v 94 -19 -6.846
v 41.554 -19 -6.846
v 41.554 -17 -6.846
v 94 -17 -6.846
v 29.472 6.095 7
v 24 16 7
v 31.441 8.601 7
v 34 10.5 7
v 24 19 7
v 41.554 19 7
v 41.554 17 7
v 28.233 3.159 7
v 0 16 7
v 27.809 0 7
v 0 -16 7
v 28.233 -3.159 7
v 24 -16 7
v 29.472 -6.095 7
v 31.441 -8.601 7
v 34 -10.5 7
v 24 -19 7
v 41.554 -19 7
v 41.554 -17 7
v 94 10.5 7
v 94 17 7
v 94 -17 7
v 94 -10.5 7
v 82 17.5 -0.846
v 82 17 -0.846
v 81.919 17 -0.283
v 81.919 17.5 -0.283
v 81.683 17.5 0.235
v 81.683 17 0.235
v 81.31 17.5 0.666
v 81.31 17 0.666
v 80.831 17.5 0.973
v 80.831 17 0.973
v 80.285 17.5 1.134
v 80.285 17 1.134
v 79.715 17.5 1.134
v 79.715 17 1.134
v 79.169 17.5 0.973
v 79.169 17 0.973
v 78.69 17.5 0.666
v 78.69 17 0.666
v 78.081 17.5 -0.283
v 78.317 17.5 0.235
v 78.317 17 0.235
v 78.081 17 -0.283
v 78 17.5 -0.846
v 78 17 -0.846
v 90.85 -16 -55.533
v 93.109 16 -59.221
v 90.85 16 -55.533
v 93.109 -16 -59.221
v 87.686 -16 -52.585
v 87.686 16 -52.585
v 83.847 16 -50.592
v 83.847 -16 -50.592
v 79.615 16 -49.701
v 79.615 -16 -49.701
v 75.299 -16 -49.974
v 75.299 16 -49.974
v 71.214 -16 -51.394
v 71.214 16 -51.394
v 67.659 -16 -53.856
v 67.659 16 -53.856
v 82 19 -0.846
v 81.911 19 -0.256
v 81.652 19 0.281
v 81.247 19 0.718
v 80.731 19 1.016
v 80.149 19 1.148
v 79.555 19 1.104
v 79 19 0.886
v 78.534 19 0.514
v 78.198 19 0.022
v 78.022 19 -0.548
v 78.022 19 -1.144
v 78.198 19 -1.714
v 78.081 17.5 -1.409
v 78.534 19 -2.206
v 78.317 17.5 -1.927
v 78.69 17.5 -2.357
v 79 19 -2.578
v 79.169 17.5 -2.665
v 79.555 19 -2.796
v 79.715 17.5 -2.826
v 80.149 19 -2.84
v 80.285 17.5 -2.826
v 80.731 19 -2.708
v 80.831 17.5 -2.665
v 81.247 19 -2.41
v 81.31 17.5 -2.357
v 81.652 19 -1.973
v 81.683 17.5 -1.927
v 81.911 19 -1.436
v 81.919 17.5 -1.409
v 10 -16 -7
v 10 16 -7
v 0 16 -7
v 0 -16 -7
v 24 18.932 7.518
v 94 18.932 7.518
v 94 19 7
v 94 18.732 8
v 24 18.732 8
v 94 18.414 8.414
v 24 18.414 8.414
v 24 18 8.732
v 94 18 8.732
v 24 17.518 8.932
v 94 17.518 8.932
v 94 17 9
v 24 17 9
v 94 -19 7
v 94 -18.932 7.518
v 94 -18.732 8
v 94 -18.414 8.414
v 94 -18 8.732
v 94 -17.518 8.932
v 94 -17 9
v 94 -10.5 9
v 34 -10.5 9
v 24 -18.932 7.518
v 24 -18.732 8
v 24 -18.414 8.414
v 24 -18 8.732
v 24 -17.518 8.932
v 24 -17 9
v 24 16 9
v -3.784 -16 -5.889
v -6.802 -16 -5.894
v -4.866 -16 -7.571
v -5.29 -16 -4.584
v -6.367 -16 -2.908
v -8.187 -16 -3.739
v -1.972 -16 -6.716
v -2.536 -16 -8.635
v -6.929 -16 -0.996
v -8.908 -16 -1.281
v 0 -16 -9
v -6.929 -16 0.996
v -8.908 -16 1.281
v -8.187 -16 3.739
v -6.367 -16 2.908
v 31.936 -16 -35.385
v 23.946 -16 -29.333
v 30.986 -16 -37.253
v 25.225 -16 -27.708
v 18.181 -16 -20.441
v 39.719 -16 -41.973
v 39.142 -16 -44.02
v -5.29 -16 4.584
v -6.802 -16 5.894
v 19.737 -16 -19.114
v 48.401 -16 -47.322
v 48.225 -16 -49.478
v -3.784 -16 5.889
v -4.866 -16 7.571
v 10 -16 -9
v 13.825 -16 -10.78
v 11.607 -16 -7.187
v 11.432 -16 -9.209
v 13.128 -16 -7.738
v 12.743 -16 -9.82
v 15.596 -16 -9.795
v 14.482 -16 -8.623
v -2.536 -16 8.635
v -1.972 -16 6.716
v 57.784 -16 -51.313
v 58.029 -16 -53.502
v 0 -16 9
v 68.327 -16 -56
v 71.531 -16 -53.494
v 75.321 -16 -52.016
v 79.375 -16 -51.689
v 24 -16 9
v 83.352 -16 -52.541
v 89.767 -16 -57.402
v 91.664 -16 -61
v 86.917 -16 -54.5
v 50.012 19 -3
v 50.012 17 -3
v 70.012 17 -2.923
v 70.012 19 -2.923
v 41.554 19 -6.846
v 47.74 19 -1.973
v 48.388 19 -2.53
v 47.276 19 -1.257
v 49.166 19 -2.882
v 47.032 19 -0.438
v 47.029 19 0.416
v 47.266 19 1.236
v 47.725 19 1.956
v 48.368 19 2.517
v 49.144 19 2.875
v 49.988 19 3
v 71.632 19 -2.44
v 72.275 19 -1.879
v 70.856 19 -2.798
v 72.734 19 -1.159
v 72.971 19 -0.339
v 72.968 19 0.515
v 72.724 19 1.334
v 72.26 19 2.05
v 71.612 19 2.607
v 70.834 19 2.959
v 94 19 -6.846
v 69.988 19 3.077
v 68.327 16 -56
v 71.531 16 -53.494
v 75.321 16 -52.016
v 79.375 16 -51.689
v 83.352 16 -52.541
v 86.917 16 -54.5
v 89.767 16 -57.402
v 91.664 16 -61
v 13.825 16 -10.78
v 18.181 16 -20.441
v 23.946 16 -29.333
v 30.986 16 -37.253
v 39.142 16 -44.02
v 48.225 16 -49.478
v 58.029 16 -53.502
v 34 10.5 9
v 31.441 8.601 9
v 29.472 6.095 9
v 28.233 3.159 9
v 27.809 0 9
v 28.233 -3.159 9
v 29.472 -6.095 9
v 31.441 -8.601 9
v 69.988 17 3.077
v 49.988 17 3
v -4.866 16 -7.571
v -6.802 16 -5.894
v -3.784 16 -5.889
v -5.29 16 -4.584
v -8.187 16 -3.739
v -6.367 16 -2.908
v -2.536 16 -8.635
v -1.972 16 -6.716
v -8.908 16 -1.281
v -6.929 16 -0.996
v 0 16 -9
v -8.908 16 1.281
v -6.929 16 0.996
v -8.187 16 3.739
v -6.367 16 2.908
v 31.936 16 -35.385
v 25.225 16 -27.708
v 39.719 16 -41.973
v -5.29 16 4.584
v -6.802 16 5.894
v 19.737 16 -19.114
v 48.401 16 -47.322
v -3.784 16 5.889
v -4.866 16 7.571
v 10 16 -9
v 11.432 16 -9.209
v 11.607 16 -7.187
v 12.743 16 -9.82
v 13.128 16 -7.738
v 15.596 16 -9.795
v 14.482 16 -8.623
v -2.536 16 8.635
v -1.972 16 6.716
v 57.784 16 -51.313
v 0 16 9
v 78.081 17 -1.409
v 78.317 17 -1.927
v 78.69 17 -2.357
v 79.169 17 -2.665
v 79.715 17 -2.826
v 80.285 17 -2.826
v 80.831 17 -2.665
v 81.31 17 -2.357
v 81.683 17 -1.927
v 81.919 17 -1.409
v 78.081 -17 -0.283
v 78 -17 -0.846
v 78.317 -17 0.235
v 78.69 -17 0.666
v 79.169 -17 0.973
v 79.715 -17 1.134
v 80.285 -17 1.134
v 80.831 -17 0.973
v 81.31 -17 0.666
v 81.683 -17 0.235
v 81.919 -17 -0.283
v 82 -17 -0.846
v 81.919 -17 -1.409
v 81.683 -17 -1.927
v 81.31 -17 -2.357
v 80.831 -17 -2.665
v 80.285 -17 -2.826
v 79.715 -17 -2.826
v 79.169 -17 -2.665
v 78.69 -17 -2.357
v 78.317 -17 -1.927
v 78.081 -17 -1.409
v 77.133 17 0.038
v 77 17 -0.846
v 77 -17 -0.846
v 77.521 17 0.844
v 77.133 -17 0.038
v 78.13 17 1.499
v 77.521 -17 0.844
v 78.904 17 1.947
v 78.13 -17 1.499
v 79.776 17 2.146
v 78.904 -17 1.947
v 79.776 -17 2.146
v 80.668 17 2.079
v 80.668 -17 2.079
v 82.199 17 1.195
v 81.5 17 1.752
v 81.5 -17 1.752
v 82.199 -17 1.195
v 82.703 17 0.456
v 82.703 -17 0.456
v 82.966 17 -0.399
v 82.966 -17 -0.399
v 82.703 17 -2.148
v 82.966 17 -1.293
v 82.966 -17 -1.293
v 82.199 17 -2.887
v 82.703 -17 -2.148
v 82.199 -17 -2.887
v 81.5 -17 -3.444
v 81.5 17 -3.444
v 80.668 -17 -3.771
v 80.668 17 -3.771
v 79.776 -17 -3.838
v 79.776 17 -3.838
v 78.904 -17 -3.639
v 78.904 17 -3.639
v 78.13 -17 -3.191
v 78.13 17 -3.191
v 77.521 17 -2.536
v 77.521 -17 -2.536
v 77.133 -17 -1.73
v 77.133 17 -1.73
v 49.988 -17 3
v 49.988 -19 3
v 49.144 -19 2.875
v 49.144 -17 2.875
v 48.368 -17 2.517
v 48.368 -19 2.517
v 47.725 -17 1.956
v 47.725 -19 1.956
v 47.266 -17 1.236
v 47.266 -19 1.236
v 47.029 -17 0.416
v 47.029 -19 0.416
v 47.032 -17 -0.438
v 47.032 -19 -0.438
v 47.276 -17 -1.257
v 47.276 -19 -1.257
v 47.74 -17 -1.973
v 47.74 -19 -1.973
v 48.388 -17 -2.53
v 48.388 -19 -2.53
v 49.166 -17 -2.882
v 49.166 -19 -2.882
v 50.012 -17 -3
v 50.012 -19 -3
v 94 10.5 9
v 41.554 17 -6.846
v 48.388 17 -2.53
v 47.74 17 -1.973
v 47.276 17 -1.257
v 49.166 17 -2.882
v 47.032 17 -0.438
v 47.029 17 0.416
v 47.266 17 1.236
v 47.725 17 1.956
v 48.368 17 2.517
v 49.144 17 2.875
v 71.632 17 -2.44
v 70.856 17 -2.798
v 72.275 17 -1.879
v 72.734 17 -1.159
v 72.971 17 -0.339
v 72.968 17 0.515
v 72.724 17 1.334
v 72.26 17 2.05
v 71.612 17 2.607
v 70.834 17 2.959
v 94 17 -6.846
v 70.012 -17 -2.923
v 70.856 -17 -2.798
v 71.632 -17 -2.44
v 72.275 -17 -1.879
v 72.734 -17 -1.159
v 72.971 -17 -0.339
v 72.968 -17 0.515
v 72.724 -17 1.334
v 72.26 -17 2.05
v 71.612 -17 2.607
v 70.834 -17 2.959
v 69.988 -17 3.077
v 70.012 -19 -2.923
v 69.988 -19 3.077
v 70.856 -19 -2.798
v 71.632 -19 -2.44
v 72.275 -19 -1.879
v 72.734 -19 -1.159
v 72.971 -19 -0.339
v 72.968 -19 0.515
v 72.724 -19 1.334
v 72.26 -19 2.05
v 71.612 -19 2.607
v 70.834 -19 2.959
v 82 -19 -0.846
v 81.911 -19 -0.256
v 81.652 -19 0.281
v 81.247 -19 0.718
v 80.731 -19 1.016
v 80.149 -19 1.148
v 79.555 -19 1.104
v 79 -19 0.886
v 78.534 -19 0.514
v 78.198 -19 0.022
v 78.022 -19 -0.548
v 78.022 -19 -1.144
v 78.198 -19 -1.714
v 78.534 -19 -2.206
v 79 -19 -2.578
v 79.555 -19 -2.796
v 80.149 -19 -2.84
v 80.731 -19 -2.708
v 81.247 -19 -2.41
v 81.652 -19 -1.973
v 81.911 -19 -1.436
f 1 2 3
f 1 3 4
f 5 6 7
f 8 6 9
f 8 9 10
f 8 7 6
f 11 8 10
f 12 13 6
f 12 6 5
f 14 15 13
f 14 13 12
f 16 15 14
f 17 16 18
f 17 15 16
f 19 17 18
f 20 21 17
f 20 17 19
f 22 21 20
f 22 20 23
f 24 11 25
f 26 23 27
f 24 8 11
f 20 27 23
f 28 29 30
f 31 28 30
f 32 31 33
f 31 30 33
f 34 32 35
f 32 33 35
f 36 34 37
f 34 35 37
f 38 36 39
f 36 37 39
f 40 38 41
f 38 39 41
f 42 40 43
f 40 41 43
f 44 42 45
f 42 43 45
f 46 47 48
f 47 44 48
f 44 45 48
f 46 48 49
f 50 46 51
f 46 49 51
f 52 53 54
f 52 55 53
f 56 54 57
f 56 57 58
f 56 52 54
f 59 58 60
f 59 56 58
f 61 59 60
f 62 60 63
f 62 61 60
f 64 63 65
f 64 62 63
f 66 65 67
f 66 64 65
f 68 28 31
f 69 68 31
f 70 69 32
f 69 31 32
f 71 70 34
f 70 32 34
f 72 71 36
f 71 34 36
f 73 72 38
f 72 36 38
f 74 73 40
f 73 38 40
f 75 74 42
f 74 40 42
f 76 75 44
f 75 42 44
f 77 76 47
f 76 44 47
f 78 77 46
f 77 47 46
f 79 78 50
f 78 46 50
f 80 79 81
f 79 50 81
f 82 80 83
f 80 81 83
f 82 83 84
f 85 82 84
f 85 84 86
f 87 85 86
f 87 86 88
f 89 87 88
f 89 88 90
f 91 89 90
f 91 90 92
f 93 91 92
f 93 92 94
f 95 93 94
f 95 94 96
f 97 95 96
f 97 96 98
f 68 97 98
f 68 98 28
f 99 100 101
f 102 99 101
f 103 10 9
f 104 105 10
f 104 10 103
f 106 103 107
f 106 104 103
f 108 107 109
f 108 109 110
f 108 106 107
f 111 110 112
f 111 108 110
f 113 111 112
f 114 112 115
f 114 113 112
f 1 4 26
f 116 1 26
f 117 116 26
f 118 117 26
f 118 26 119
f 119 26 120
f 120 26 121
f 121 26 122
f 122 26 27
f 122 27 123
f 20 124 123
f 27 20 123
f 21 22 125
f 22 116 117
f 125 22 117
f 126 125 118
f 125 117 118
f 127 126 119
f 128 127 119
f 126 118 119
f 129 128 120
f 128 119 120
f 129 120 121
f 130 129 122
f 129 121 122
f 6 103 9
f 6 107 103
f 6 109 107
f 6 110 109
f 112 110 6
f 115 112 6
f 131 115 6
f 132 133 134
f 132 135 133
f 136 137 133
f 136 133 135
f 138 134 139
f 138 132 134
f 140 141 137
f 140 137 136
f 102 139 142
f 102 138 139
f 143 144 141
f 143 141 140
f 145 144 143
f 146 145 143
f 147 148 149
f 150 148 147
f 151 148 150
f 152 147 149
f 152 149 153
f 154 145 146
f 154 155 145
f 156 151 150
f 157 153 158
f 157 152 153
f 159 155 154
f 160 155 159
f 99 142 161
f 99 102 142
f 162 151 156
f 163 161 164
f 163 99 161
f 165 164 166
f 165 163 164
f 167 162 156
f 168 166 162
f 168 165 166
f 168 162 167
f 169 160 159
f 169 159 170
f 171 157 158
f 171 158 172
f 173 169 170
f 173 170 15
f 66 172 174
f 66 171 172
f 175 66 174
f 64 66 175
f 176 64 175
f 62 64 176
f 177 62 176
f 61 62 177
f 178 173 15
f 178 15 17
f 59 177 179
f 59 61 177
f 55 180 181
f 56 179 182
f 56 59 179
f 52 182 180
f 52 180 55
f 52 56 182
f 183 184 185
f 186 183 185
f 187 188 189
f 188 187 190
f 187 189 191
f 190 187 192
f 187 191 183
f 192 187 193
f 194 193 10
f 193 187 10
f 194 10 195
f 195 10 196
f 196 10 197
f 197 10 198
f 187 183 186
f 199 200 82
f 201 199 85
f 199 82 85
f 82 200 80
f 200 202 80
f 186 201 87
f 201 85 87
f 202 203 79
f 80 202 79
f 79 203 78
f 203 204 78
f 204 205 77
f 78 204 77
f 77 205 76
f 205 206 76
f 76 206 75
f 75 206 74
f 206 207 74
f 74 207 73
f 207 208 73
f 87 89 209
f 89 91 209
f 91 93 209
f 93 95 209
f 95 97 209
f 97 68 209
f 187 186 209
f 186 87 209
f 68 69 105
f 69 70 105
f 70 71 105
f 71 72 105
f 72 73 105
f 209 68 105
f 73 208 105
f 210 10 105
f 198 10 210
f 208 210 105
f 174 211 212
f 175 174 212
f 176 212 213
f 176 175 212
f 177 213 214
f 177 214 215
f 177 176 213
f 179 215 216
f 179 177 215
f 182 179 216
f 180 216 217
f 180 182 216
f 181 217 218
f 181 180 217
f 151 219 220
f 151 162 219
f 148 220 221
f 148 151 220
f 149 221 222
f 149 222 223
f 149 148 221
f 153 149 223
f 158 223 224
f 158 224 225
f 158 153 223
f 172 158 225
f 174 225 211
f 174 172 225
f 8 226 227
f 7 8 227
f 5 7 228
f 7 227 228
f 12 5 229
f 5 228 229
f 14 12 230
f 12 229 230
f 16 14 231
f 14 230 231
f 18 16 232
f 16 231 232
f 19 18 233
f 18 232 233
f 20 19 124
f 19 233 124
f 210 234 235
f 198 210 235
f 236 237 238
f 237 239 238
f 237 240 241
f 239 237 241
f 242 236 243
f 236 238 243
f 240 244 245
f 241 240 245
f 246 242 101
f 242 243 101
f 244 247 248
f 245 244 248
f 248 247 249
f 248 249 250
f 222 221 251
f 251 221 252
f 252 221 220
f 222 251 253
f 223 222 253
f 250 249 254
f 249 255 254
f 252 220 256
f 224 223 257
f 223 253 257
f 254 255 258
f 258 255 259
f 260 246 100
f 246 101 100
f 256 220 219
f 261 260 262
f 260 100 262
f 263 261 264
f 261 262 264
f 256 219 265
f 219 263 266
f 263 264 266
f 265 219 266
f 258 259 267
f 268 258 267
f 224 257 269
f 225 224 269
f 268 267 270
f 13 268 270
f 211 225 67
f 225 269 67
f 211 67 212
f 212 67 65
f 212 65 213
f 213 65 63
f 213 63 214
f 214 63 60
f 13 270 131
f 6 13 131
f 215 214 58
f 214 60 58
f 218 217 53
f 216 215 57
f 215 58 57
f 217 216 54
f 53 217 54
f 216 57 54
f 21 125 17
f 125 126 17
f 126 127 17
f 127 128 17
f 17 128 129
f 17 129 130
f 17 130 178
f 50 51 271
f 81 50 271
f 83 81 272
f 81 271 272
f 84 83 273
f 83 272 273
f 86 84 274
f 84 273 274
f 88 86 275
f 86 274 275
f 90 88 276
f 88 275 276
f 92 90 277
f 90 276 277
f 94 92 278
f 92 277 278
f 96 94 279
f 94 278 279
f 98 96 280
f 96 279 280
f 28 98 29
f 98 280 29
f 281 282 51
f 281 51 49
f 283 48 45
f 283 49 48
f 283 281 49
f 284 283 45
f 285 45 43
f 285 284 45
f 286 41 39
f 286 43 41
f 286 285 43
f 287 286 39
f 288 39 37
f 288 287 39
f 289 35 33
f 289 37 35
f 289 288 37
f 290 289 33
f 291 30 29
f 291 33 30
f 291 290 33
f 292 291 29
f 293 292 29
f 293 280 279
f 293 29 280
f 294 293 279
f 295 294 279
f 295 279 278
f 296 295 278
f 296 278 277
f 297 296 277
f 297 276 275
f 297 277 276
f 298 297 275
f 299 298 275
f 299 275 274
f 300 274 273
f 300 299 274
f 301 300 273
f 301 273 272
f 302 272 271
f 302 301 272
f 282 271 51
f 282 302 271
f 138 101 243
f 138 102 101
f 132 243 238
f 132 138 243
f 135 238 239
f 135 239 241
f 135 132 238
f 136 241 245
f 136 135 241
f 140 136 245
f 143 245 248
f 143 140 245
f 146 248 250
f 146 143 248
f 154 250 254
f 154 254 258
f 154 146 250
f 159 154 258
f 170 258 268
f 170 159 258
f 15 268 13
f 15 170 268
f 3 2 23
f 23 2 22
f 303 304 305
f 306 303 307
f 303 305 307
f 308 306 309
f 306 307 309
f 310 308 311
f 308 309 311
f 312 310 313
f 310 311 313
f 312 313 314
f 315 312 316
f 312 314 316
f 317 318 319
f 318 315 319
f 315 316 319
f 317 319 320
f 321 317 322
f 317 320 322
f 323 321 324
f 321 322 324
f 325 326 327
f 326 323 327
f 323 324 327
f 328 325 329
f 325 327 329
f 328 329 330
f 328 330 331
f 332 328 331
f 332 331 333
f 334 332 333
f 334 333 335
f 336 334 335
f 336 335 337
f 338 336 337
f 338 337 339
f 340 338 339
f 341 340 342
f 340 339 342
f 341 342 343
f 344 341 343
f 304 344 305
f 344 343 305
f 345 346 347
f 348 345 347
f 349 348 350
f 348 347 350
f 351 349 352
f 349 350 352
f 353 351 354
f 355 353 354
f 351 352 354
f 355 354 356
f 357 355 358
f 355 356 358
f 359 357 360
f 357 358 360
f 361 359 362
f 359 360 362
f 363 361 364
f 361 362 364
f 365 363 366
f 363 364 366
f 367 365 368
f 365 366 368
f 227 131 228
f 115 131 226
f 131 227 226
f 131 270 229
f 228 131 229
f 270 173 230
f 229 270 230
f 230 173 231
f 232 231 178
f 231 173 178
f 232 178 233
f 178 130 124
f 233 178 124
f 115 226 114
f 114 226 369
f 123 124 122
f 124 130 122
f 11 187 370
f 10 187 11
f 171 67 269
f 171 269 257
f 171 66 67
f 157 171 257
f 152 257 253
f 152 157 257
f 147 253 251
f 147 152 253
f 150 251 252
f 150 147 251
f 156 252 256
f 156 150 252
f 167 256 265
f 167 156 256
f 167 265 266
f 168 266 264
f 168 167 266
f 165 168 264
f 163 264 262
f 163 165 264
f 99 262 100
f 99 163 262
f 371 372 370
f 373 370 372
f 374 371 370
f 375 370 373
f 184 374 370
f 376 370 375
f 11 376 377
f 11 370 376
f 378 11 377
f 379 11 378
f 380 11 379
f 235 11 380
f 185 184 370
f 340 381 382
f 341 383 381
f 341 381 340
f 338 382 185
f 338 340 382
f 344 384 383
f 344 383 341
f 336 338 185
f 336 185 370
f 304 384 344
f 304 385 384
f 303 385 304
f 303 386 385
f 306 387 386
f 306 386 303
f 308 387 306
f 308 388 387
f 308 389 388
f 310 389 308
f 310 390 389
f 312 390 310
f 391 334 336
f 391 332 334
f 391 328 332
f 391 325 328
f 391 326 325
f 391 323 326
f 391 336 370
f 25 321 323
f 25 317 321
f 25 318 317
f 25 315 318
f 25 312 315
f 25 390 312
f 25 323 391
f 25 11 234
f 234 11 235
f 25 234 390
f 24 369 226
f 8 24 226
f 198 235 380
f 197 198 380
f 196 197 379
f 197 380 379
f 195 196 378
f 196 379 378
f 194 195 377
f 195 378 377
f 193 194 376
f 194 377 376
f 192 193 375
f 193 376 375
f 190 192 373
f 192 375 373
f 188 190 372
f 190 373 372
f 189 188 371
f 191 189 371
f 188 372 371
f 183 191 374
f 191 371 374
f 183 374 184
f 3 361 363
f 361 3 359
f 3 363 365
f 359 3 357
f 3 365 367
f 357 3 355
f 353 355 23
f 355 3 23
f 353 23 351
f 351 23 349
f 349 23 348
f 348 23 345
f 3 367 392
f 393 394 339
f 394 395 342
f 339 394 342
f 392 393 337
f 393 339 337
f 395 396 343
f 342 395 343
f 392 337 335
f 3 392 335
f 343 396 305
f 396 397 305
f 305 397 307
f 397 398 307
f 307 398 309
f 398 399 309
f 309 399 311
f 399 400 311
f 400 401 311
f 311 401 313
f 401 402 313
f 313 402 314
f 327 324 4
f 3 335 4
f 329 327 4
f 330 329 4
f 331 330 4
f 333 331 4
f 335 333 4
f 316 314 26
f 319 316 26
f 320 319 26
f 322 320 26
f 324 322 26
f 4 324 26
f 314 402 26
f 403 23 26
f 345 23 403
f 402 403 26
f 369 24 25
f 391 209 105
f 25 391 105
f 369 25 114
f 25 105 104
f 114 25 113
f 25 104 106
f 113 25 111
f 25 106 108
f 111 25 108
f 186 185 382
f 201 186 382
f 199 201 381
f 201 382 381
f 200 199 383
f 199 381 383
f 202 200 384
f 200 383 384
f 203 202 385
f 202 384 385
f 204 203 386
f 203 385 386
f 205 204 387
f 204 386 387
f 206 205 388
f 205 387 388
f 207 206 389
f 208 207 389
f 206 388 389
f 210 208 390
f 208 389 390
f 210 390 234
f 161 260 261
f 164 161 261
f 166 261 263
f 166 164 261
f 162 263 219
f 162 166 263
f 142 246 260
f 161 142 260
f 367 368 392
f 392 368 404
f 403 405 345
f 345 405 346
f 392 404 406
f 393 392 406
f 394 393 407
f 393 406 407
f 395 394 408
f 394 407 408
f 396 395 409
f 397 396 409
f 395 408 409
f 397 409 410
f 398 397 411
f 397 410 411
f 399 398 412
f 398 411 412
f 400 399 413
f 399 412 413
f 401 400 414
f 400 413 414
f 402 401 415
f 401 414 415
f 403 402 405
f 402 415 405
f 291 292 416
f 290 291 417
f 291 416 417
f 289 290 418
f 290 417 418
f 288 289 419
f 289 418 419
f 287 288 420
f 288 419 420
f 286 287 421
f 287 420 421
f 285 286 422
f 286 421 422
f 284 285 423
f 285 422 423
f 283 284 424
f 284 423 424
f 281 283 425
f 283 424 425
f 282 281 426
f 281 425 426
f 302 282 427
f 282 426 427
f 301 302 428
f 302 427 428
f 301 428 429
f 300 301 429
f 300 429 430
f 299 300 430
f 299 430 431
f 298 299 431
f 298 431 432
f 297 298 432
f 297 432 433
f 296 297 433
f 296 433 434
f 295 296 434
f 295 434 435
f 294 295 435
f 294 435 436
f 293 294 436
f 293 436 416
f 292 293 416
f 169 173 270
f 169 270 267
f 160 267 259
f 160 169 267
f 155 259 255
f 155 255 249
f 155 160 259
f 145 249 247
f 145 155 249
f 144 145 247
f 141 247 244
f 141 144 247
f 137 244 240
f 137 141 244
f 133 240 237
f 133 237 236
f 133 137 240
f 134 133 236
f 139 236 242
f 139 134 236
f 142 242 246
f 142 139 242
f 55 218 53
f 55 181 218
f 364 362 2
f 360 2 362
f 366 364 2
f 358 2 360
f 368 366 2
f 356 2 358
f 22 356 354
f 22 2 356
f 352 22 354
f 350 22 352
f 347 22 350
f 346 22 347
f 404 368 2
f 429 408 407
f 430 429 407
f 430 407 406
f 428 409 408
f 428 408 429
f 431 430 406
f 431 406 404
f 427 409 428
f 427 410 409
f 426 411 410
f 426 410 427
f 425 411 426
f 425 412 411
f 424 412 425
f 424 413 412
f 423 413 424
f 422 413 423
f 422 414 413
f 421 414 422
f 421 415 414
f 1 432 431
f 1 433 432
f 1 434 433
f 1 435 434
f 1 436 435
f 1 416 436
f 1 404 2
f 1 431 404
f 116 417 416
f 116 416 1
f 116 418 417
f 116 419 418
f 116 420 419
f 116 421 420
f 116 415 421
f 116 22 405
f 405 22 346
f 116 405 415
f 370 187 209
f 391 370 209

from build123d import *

# Parameters (mm, degrees)
F1_DEPTH  = 16
F2_W      = 70
F2_H      = 3
F3_DEPTH  = 2
F4_W      = 52.4458656609
F4_H      = 13.8459985778
F5_DEPTH  = 2
F8_DEPTH  = 2
F9_R      = 2
F11_DEPTH = 38.001
F13_D     = 4
F14_R     = 3
F14_R_2   = 2
F15_DEPTH = 34.5


with BuildPart() as f1:
    # F0 (on Front) → F1 (new body)
    with BuildSketch(Plane.XZ):
        with BuildLine():
            Line((94, 9), (0, 9))
            ThreePointArc((0, 9), (-9, 0), (0, -9))
            Line((0, -9), (10, -9))
            ThreePointArc((10, -9), (12.1096761181, -9.4668701015), (13.8253743549, -10.7802933293))
            ThreePointArc((13.8253743549, -10.7802933293), (34.9359413113, -40.7908803671), (68.327168476, -56))
            ThreePointArc((68.327168476, -56), (81.3946239912, -51.9695299334), (91.6636888451, -61))
            Line((91.6636888451, -61), (93.1092569516, -59.2209782))
            ThreePointArc((93.1092569516, -59.2209782), (81.7616044026, -50.0028575081), (67.6586675506, -53.8564453964))
            ThreePointArc((67.6586675506, -53.8564453964), (35.7039452814, -38.8251123565), (15.5964314226, -9.7952461033))
            ThreePointArc((15.5964314226, -9.7952461033), (13.1278365305, -7.7376810494), (10, -7))
            Line((10, -7), (0, -7))
            ThreePointArc((0, -7), (-7, 0), (0, 7))
            Line((0, 7), (94, 7))
            Line((94, 7), (94, 9))
        make_face()
    extrude(amount=F1_DEPTH)

    # F2 (on face) → F3 (join)
    with BuildSketch(Plane.XY.offset(9)):
        with Locations((59, -17.5)):
            Rectangle(F2_W, F2_H)
    extrude(amount=-F3_DEPTH)

    # F4 (on face) → F5 (join)
    with BuildSketch(Plane.XZ.offset(19)):
        with Locations((67.7770671695, 0.0770007111)):
            Rectangle(F4_W, F4_H)
    extrude(amount=-F5_DEPTH)

    # F6: F1 across face


with BuildPart() as f1_1:
    add(f1.part)
    add(f1.part.mirror(Plane(origin=(40.1817011291, 0, -15.4832521129), x_dir=(1, 0, 0), z_dir=(0, 1, 0))))

    # F7 (on face) → F8 (cut)
    with BuildSketch(Plane.XY.offset(9)):
        with BuildLine():
            Line((34, -10.5), (94, -10.5))
            Line((94, -10.5), (94, 10.5))
            Line((94, 10.5), (34, 10.5))
            ThreePointArc((34, 10.5), (27.8094750193, 0), (34, -10.5))
        make_face()
    extrude(amount=-F8_DEPTH, mode=Mode.SUBTRACT)

    # F9
    f9_edges = [f1_1.edges().sort_by_distance(p)[0] for p in [
        (59, -19, 9),
        (59, 19, 9),
    ]]
    fillet(f9_edges, radius=F9_R)

    # F10 (on face) → F11 (cut, through all)
    with BuildSketch(Plane.XZ.offset(19)):
        with BuildLine():
            ThreePointArc((70.0115500211, -2.922977055), (72.9999777661, 0.0885507322), (69.9884499789, 3.0769784772))
            Line((69.9884499789, 3.0769784772), (49.9884499789, 2.9999777661))
            ThreePointArc((49.9884499789, 2.9999777661), (47.0000222339, -0.0115500211), (50.0115500211, -2.9999777661))
            Line((50.0115500211, -2.9999777661), (70.0115500211, -2.922977055))
        make_face()
    extrude(amount=-F11_DEPTH, mode=Mode.SUBTRACT)

    # F13 (through all)
    with Locations(Plane(origin=(0, 19, 0), x_dir=(-1, 0, 0), z_dir=(0, 1, 0))):
        with Locations((-80, -0.8459985778)):
            Hole(F13_D / 2)

    # F14 (on face) → F15 (join)
    with BuildSketch(Plane(origin=(0, -17, 0), x_dir=(-1, 0, 0), z_dir=(0, 1, 0))):
        with Locations((-80, -0.8459985778)):
            Circle(F14_R)
        with Locations((-80, -0.8459985778)):
            Circle(F14_R_2, mode=Mode.SUBTRACT)
    extrude(amount=F15_DEPTH)


solid = f1_1.part
